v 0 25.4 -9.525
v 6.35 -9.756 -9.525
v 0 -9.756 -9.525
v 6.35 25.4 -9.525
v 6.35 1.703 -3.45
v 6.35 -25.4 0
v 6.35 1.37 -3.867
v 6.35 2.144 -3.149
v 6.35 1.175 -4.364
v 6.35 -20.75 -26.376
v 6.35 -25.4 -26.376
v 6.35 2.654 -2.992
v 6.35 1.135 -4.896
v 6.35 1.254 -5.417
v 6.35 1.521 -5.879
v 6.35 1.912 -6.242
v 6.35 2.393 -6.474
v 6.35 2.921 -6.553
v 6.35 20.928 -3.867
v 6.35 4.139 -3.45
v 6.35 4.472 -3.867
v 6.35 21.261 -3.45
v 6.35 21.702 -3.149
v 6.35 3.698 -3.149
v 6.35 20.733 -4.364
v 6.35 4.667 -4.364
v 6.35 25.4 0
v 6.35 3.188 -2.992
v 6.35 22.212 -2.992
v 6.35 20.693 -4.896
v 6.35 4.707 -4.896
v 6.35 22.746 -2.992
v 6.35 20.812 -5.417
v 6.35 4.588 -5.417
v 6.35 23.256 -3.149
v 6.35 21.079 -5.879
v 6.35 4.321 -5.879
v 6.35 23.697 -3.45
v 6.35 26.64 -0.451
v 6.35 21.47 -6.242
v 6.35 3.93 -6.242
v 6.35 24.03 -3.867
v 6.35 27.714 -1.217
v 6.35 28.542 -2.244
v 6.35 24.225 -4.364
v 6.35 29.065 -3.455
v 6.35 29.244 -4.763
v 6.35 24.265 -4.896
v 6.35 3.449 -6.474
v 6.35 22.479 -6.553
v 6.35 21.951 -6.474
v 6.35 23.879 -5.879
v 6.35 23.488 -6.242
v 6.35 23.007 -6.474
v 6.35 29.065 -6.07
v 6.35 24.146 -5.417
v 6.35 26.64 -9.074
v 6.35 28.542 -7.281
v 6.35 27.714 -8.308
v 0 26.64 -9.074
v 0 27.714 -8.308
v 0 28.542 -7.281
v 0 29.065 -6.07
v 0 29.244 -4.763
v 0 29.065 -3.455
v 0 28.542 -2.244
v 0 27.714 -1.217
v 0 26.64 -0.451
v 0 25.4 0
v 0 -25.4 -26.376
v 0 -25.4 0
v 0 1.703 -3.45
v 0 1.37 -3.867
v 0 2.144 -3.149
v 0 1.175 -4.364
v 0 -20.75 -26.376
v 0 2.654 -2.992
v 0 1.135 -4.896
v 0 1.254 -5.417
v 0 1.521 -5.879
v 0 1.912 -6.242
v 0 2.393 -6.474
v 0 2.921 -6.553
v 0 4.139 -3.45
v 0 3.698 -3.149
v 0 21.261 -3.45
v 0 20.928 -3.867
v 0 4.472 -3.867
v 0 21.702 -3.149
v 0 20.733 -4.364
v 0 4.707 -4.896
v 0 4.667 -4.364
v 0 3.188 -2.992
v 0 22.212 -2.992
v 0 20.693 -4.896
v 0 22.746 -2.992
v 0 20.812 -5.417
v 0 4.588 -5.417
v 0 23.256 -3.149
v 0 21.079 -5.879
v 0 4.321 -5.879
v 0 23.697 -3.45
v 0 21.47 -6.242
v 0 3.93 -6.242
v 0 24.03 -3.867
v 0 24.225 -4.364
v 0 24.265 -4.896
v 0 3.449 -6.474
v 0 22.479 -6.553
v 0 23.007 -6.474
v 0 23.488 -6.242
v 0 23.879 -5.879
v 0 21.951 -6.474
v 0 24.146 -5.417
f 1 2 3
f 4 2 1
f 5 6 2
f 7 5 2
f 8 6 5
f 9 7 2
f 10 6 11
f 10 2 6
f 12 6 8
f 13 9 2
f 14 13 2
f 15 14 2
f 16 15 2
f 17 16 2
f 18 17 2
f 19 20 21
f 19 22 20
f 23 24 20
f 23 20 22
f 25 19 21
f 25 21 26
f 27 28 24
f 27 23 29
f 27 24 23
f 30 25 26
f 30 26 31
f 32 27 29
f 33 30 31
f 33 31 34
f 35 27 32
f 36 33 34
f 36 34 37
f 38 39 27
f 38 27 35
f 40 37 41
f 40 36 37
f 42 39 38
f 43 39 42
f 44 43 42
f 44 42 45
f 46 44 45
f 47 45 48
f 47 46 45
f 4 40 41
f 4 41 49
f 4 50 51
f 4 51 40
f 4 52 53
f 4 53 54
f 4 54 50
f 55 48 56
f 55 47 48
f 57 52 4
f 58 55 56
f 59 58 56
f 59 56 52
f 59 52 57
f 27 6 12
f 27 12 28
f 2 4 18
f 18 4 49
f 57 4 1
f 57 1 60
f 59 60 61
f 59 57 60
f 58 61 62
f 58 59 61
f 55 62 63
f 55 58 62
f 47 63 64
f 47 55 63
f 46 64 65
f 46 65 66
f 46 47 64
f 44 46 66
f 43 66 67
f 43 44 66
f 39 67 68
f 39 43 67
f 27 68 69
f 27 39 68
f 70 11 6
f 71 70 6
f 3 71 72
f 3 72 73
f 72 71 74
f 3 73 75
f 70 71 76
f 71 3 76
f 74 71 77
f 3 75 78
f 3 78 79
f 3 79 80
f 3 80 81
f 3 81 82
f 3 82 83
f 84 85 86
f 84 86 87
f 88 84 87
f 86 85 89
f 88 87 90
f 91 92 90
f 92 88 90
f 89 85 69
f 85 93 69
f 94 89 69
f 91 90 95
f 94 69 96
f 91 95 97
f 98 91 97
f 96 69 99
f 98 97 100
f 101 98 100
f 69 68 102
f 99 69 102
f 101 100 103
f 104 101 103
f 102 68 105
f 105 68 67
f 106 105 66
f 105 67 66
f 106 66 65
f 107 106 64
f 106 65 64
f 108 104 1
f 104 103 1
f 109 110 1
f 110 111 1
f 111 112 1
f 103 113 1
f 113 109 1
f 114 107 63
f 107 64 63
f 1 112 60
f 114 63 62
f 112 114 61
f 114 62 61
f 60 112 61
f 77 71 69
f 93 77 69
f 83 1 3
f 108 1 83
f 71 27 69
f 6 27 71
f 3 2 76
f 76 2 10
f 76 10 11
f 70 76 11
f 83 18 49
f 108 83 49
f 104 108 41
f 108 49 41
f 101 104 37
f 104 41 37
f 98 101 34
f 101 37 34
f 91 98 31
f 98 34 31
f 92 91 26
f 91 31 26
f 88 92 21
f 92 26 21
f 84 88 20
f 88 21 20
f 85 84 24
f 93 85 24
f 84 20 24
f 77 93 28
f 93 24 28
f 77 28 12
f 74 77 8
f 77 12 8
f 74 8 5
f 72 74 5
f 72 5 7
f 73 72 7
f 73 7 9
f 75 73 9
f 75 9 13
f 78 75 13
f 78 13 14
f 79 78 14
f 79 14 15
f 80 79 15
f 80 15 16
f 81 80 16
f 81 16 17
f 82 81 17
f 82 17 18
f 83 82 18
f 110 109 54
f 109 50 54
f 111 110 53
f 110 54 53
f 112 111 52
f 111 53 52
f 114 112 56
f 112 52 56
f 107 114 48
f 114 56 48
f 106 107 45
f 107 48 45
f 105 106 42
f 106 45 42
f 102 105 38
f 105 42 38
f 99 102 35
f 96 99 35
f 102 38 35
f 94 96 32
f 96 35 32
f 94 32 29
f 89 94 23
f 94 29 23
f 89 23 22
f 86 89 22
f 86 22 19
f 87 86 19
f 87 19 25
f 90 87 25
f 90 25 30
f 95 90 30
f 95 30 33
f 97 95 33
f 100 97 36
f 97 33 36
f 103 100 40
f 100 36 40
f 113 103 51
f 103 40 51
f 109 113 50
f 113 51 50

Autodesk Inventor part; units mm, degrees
ref_plane "YZ Plane" through (0, 0, 0) normal (1, 0, 0) x (0, 1, 0)
ref_plane "XZ Plane" through (0, 0, 0) normal (0, 1, 0) x (-1, 0, 0)
ref_plane "XY Plane" through (0, 0, 0) normal (0, 0, 1) x (1, 0, 0)
sketch "Sketch1" plane through (0, 0, 0) normal (1, 0, 0) x (0, 1, 0)
  line L0 (0, 0) -> (25.4, 0)
  line L1 (25.4, 0) -> (25.4, -9.525)
  line L2 (25.4, -9.525) -> (0, -9.525)
  line L3 (0, -9.525) -> (0, 0)
  dimension "d0" = 25.4
  dimension "d1" = 9.525
extrude "Extrusion1" add sketch "Sketch1" along normal blind 6.35
sketch "Sketch2" plane through (6.35, 0, 0) normal (1, 0, 0) x (0, 0, -1)
  line L0 (9.525, 25.4) -> (0, 25.4) projected
  line L1 (0, 0) -> (9.525, 25.4)
  line L2 (9.525, 25.4) -> (0, 25.4)
  line L3 (0, 0) -> (9.525, 0) projected
  line L4 (0, 25.4) -> (9.525, 0)
  circle A0 centre (4.7625, 12.7) radius 9.779
  circle A1 centre (4.7625, 22.479) radius 1.7907
  circle A2 centre (4.7625, 2.921) radius 1.7907
  dimension "d4" = 19.558
  dimension "d5" = 3.5814
  dimension "d6" = 3.5814
extrude "Extrusion2" cut sketch "Sketch2" against normal blind 14.2875 contours A1 A0 | A0 A1 | A2 A0 | A0 A2
sketch "Sketch3" plane through (6.35, 0, 0) normal (1, 0, 0) x (0, 0, -1)
  line L0 (9.525, 25.4) -> (0, 25.4) projected
  arc A0 (9.525, 25.4) -> (0, 25.4) centre (4.7625, 24.3714) ccw
  point P0 (0, 0)
extrude "Extrusion3" add sketch "Sketch3" against normal blind 6.35
sketch "Sketch4" plane through (6.35, 0, 0) normal (1, 0, 0) x (0, 0, -1)
  line L0 (0, 0) -> (9.525, 0) projected
  line L1 (9.525, 0) -> (0, 0)
  line L2 (0, 0) -> (0, -25.4)
  line L3 (0, -25.4) -> (9.525, -25.4)
  line L4 (9.525, -25.4) -> (9.525, 0)
  dimension "d15" = 25.4
extrude "Extrusion4" add sketch "Sketch4" against normal blind 6.35
sketch "Sketch5" plane through (6.35, 0, 0) normal (1, 0, 0) x (0, 0, -1)
  line L0 (9.525, -25.4) -> (9.525, 25.4) projected
  line L1 (9.525, -9.7563) -> (33.5033, -25.4)
  line L2 (33.5033, -25.4) -> (9.525, -25.4)
  point P0 (0, 0)
extrude "Extrusion5" add sketch "Sketch5" against normal blind 6.35
sketch "Sketch6" plane through (6.35, 0, 0) normal (1, 0, 0) x (0, 0, -1)
  line L0 (26.3764, -37.8164) -> (39.194, -37.8164)
  line L1 (39.194, -37.8164) -> (39.194, -17.7508)
  line L2 (39.194, -17.7508) -> (26.3764, -17.7508)
  line L3 (26.3764, -17.7508) -> (26.3764, -37.8164)
  point P0 (0, 0)
extrude "Extrusion6" cut sketch "Sketch6" against normal blind 63.5
properties part number "GripperOnS"
